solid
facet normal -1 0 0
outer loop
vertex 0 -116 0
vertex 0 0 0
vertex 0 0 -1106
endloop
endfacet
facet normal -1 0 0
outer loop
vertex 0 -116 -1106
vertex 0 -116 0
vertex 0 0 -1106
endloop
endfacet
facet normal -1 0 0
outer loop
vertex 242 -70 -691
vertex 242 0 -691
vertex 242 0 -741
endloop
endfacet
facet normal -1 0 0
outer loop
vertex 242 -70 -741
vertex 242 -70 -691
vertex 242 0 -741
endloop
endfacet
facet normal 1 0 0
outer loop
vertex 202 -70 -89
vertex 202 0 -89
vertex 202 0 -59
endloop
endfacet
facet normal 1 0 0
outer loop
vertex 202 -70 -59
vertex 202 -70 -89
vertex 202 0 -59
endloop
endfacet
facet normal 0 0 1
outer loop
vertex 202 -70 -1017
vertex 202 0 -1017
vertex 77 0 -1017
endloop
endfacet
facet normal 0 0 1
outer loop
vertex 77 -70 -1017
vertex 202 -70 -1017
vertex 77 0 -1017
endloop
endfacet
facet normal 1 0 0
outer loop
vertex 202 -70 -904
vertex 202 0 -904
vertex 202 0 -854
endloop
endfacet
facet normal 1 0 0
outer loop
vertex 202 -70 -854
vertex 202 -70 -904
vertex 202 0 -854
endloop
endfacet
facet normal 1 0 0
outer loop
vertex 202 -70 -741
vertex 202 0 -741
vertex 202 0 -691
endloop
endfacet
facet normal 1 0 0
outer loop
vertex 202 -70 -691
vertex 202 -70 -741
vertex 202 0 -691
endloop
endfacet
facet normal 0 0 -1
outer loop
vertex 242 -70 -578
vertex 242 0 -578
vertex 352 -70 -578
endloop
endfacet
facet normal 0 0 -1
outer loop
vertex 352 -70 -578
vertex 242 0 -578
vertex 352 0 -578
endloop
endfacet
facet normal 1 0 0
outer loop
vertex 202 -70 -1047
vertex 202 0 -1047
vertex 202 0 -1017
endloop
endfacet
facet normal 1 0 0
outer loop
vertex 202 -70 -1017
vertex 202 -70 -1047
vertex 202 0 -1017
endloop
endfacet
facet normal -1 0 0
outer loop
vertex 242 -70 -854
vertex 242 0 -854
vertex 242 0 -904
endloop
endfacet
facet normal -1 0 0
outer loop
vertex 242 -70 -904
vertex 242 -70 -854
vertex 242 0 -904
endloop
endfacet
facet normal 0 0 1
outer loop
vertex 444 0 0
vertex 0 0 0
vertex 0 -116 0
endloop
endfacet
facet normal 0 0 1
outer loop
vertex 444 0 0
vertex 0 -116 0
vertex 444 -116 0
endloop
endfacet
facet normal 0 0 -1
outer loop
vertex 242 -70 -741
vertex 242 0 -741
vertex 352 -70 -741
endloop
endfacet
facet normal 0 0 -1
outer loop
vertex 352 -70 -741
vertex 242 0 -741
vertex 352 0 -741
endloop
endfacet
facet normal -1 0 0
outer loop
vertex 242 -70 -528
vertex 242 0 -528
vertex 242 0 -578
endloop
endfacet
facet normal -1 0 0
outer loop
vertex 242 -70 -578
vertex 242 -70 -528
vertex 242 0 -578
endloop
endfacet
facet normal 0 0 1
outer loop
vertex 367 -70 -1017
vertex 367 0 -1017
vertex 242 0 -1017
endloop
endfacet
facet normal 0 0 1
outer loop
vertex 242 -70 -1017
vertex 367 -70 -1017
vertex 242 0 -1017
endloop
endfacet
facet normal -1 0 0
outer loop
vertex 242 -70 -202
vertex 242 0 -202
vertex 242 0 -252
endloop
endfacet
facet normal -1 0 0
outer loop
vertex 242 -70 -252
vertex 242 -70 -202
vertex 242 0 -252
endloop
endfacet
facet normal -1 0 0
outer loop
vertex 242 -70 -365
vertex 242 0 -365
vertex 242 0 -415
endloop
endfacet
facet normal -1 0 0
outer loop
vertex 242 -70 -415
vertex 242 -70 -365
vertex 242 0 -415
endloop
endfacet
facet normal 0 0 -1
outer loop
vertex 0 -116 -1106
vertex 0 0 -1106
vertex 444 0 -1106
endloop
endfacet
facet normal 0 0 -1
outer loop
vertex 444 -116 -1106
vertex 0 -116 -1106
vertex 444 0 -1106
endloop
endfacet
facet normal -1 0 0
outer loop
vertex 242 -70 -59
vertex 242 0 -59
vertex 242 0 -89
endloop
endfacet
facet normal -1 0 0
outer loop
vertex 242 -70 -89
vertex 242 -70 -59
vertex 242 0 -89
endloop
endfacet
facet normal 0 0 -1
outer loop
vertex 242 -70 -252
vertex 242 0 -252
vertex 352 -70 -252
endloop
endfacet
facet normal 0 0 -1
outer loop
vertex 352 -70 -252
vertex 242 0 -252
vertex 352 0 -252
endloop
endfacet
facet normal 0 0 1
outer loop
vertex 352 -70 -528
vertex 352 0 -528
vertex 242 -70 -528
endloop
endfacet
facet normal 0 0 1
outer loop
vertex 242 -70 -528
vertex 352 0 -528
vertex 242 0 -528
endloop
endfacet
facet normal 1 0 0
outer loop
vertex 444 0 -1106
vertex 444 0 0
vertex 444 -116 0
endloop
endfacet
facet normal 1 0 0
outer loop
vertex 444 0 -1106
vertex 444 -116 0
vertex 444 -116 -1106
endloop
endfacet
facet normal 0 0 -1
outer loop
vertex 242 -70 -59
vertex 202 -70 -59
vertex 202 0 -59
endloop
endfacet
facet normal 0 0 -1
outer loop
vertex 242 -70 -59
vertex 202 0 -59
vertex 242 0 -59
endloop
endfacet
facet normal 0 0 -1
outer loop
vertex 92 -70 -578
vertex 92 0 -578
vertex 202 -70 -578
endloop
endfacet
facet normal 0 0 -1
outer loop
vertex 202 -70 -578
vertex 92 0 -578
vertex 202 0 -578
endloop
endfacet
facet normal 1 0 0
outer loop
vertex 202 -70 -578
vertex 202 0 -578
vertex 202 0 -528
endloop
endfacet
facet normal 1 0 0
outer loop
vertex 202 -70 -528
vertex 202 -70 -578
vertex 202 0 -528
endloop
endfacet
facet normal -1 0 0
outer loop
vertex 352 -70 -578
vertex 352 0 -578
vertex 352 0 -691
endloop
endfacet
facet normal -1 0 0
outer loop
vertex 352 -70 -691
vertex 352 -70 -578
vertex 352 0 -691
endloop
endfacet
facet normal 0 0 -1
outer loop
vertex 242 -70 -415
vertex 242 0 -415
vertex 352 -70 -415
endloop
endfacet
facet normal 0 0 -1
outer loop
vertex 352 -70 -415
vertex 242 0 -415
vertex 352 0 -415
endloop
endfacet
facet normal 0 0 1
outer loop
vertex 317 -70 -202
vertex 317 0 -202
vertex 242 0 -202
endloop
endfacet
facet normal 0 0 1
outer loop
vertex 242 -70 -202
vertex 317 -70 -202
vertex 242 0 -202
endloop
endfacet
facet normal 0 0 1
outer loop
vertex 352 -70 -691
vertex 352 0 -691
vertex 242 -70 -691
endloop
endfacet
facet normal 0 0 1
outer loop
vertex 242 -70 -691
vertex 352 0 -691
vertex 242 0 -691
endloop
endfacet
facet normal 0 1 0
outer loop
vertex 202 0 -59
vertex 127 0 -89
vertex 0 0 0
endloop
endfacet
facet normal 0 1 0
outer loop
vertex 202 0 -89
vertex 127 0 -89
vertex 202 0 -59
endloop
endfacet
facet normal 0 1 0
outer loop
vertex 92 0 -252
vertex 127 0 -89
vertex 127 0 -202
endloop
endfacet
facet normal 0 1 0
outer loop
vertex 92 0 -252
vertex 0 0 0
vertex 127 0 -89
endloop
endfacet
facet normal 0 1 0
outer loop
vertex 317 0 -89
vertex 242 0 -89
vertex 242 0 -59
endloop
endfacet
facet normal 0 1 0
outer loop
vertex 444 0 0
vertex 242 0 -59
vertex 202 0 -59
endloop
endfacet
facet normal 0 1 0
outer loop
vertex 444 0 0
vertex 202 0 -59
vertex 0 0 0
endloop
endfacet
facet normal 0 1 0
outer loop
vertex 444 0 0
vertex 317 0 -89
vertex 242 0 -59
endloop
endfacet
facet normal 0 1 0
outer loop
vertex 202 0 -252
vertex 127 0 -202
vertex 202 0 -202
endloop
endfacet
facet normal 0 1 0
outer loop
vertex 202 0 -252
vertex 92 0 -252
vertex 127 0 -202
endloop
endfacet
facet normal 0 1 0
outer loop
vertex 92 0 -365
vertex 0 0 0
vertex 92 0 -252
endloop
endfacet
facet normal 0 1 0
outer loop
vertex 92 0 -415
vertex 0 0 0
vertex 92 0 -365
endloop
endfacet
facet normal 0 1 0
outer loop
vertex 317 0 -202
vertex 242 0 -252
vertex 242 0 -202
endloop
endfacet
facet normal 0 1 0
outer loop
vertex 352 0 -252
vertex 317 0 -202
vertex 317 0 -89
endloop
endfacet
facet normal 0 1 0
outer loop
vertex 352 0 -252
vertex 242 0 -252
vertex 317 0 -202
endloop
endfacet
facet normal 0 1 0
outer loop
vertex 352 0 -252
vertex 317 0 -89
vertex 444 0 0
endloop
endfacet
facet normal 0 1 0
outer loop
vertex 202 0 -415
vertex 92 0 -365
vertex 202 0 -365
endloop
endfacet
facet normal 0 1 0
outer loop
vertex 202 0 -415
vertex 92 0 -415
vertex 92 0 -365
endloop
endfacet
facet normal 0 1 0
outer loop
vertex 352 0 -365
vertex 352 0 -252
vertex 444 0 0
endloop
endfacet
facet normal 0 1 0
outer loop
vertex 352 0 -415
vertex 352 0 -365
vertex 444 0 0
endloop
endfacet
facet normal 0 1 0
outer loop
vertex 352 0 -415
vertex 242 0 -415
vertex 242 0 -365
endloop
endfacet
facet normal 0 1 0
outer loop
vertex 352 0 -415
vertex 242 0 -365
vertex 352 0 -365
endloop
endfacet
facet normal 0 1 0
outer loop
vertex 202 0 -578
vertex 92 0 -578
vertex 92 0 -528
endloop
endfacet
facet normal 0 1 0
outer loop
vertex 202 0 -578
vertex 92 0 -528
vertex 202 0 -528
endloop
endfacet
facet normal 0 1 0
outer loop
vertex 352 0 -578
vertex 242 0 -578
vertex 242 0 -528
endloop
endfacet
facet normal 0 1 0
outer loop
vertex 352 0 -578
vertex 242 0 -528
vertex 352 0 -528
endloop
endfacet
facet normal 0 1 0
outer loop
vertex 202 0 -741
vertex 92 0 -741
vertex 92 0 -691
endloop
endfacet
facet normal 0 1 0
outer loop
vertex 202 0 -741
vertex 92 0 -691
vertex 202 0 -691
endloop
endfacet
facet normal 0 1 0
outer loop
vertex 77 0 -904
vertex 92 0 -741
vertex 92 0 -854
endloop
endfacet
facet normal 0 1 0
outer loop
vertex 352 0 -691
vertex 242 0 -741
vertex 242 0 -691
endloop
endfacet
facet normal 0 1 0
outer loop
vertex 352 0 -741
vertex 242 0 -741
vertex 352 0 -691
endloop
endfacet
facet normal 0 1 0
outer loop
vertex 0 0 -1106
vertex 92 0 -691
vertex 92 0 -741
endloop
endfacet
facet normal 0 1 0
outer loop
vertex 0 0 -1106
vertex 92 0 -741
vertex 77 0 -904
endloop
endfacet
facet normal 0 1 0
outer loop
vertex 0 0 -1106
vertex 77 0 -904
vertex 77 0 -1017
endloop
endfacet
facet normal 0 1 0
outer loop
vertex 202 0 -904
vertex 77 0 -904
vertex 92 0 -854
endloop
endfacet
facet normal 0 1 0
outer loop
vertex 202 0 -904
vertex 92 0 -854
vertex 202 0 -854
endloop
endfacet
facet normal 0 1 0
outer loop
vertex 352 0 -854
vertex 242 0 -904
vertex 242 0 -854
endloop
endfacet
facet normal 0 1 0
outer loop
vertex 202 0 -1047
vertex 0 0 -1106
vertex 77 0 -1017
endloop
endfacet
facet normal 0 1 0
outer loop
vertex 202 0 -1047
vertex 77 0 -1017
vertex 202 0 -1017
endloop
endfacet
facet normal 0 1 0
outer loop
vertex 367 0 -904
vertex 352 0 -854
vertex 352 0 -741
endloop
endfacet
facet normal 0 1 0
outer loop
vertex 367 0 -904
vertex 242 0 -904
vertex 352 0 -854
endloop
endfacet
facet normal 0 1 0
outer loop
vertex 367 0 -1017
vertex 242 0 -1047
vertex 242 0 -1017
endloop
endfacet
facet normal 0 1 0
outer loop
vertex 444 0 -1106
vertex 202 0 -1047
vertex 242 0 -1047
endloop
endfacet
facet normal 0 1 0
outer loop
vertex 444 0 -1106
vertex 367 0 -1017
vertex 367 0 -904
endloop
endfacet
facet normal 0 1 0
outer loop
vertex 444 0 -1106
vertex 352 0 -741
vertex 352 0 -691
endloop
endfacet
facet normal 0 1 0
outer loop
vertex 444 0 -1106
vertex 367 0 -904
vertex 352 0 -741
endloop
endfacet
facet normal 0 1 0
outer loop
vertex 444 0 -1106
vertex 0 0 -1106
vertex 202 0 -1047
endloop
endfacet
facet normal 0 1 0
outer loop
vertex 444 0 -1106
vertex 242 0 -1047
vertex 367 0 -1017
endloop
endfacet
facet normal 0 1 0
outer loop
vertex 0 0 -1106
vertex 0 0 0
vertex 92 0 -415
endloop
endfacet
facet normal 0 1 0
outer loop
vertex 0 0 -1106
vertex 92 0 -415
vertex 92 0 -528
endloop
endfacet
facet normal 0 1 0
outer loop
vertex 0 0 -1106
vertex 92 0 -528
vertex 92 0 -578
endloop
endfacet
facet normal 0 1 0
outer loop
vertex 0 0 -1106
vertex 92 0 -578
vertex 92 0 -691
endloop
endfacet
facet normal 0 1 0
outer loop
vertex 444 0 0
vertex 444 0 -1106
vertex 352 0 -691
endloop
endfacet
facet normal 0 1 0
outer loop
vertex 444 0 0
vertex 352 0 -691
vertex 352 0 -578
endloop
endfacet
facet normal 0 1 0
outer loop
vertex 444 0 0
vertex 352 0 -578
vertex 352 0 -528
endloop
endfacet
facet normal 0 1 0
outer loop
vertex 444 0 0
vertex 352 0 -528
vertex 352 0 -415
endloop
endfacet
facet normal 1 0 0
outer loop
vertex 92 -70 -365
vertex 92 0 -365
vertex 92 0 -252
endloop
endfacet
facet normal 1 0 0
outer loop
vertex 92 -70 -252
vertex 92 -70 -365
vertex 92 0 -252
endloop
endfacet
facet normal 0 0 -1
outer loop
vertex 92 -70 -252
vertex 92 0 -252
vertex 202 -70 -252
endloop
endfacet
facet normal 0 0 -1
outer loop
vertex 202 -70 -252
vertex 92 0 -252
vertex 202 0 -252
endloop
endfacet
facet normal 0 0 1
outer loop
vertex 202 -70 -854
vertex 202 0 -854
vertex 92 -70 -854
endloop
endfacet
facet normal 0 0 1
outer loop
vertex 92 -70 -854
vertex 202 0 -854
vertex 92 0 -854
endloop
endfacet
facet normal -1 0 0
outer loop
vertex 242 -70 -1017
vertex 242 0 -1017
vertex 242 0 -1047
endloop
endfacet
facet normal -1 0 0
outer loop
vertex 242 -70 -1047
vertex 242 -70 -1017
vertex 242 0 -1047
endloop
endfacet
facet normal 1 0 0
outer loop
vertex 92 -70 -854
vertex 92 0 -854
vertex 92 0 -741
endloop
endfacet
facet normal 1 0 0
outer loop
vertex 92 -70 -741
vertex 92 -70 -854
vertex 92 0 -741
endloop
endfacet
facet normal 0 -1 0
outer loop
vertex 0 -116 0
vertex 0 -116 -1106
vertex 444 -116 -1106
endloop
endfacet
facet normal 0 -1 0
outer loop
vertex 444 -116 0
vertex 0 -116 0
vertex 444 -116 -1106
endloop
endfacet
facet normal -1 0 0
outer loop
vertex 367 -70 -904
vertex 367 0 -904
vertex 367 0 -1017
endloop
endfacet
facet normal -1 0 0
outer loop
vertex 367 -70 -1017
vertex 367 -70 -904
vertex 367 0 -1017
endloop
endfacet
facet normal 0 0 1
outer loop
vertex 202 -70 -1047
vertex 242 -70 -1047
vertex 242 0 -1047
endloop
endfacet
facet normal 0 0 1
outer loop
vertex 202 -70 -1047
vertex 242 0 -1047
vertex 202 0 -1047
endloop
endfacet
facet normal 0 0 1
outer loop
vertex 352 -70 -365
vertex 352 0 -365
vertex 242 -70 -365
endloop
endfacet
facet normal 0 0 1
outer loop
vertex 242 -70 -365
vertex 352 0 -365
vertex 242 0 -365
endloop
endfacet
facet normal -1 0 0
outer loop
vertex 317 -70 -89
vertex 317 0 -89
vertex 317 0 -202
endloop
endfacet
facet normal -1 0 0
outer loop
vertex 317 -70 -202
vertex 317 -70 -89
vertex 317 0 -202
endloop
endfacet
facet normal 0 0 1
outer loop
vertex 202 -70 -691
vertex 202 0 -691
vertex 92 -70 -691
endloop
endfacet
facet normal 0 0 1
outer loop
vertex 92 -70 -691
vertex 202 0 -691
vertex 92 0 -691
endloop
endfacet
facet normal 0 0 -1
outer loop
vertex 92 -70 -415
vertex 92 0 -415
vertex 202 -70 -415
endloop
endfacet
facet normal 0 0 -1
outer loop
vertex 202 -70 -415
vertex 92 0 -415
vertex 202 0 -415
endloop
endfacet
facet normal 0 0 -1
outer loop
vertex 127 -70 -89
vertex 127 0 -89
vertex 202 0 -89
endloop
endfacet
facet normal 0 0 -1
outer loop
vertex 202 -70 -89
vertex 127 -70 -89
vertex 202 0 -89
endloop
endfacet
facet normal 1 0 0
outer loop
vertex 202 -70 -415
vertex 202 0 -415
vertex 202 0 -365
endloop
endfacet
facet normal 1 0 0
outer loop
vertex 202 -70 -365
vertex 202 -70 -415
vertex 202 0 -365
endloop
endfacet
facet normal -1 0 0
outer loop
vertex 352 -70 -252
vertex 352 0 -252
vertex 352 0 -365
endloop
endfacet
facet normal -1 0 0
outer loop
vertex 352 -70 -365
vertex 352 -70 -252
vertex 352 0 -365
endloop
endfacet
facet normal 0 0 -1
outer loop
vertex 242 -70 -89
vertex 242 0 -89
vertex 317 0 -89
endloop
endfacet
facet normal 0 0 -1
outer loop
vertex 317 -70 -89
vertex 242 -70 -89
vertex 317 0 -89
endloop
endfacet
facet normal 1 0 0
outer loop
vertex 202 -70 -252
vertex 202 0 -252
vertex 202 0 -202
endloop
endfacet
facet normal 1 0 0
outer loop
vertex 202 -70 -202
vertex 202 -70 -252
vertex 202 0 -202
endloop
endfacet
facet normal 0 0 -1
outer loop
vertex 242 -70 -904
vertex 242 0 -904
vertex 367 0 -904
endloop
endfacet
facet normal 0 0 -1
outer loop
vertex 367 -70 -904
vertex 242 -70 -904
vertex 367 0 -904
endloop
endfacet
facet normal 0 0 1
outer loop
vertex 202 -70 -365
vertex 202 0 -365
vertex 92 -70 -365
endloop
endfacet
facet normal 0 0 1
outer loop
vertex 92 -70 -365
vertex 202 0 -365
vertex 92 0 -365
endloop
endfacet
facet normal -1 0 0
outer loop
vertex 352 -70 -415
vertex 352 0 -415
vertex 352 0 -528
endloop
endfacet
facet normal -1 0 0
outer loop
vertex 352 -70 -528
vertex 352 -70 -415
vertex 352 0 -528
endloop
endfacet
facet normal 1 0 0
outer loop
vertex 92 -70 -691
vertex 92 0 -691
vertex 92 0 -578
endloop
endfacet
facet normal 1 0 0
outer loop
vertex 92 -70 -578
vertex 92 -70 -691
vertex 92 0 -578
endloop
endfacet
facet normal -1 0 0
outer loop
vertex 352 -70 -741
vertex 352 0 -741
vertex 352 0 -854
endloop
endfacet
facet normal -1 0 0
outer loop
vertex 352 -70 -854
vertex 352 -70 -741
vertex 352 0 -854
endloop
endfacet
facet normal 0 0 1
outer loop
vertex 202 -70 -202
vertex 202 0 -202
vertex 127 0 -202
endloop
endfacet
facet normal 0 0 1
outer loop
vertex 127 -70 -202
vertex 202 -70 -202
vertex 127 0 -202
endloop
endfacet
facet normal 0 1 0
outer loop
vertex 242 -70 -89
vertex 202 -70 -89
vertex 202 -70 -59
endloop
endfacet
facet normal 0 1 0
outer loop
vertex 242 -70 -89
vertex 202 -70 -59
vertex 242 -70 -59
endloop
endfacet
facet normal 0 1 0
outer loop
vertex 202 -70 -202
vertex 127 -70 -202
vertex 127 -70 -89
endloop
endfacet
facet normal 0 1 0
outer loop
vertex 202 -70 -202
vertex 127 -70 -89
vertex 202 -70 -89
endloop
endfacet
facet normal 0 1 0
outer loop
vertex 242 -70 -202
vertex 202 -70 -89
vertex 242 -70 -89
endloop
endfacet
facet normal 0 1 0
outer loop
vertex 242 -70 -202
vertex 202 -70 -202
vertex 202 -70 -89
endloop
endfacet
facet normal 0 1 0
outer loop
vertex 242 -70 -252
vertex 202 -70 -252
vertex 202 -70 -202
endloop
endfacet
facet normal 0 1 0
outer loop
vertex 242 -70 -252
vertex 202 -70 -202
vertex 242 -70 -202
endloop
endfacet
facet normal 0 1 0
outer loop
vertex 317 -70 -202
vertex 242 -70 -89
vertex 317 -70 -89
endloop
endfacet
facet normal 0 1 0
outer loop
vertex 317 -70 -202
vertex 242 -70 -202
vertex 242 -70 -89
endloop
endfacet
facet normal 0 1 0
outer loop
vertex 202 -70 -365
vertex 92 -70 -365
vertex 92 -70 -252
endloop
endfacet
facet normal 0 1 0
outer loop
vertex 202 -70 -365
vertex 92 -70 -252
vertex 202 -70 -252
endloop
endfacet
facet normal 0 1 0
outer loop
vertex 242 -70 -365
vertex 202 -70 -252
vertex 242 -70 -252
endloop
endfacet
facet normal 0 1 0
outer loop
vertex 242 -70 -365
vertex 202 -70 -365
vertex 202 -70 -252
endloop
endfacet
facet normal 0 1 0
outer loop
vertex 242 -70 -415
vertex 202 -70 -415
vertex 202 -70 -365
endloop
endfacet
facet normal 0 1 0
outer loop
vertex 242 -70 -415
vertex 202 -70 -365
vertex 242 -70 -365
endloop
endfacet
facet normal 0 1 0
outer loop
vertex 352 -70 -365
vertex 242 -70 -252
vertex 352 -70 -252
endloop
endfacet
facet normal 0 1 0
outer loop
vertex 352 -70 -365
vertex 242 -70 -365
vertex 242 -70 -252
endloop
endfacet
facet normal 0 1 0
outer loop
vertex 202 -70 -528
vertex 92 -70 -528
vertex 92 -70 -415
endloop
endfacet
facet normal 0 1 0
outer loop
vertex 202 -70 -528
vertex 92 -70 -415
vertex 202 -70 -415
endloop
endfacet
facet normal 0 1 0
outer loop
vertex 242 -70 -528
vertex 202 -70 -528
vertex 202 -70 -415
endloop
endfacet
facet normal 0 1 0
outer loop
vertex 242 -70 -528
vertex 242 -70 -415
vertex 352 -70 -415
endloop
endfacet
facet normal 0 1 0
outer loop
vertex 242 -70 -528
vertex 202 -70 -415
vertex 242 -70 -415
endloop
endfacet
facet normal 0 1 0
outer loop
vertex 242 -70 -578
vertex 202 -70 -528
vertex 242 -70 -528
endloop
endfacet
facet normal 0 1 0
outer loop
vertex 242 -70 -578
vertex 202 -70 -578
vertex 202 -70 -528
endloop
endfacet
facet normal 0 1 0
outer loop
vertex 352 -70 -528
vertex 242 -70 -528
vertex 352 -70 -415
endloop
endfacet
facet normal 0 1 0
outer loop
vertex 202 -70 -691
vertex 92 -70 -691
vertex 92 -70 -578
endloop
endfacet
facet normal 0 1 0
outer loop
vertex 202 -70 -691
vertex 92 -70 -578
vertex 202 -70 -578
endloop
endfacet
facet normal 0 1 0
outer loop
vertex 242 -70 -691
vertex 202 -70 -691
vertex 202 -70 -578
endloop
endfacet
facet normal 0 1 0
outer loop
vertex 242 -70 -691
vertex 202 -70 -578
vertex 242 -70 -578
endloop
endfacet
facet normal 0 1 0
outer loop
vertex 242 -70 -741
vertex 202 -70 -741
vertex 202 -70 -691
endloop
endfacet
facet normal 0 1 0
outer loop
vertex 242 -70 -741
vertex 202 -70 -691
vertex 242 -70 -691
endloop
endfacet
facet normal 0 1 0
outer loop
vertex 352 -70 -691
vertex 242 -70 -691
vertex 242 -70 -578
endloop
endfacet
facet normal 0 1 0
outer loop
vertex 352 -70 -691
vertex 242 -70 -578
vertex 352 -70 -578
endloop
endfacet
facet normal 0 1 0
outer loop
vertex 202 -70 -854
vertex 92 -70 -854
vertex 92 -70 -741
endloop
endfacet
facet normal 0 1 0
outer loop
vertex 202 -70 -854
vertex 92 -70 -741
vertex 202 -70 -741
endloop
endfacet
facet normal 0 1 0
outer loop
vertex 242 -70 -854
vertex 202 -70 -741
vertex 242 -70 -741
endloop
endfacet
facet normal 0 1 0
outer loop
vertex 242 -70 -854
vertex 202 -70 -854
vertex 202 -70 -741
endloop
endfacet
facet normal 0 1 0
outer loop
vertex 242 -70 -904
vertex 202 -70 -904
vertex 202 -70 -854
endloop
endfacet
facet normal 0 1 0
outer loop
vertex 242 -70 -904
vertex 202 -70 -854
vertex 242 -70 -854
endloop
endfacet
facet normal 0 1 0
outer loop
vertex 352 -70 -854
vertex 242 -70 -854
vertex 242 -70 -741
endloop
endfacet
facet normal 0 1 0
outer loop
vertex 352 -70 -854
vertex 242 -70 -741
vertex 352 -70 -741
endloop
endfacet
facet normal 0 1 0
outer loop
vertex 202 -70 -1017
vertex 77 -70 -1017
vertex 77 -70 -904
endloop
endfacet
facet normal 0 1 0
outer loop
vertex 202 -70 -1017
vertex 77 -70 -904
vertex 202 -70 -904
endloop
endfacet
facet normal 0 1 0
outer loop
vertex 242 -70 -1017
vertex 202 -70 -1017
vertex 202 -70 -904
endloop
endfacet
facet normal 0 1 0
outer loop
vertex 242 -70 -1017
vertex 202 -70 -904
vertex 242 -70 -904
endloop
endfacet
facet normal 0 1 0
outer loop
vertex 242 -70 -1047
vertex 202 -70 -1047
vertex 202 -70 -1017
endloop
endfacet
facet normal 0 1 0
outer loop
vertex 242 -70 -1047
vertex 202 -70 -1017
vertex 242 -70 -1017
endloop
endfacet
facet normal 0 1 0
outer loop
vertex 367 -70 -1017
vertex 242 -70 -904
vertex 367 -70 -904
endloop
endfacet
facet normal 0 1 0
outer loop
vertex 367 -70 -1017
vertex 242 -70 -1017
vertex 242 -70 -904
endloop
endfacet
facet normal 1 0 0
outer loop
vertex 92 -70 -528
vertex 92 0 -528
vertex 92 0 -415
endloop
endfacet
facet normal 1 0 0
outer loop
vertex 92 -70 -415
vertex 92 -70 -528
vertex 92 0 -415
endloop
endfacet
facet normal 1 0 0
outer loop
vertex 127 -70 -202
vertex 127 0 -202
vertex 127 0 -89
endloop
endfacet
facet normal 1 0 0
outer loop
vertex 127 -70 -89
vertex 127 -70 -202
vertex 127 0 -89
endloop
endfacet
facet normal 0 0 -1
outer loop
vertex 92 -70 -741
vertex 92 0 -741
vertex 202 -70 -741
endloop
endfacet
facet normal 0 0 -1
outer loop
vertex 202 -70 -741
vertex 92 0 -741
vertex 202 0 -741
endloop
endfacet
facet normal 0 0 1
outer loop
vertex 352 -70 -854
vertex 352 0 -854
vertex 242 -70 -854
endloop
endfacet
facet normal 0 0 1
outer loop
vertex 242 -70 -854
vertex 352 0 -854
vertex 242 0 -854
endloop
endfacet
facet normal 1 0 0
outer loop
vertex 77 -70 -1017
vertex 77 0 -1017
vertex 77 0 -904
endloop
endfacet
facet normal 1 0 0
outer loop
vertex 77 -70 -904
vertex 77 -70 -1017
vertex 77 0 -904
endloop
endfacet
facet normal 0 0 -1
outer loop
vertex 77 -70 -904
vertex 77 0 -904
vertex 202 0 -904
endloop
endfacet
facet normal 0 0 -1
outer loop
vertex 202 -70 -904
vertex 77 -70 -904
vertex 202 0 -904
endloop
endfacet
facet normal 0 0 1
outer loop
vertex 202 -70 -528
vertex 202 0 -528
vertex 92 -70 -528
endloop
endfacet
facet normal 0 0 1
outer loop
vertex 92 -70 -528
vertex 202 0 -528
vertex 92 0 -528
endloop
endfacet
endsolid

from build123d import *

# Parameters (mm, degrees)
SKETCH_1_W          = 444
SKETCH_1_H          = 1106
EXTRUDE_305_DEPTH   = 116
CUT_EXTRUDE_1_DEPTH = 70


with BuildPart() as part:
    # Эскиз1 → Extrude 305 (new body)
    with BuildSketch(Plane(origin=(0, 0, 0), x_dir=(1, 0, 0), z_dir=(0, 1, 0))):
        with Locations((222, 553)):
            Rectangle(SKETCH_1_W, SKETCH_1_H)
    extrude(amount=-EXTRUDE_305_DEPTH)

    # Эскиз2 → Вырез-Вытянуть1 (cut)
    with BuildSketch(Plane(origin=(0, 0, 0), x_dir=(1, 0, 0), z_dir=(0, 1, 0))):
        Polygon((242, 1047), (202, 1047), (202, 1017), (77, 1017), (77, 904), (202, 904), (202, 854), (92, 854), (92, 741), (202, 741), (202, 691), (92, 691), (92, 578), (202, 578), (202, 528), (92, 528), (92, 415), (202, 415), (202, 365), (92, 365), (92, 252), (202, 252), (202, 202), (127, 202), (127, 89), (202, 89), (202, 59), (242, 59), (242, 89), (317, 89), (317, 202), (242, 202), (242, 252), (352, 252), (352, 365), (242, 365), (242, 415), (352, 415), (352, 528), (242, 528), (242, 578), (352, 578), (352, 691), (242, 691), (242, 741), (352, 741), (352, 854), (242, 854), (242, 904), (367, 904), (367, 1017), (242, 1017), align=None)
    extrude(amount=-CUT_EXTRUDE_1_DEPTH, mode=Mode.SUBTRACT)


solid = part.part
